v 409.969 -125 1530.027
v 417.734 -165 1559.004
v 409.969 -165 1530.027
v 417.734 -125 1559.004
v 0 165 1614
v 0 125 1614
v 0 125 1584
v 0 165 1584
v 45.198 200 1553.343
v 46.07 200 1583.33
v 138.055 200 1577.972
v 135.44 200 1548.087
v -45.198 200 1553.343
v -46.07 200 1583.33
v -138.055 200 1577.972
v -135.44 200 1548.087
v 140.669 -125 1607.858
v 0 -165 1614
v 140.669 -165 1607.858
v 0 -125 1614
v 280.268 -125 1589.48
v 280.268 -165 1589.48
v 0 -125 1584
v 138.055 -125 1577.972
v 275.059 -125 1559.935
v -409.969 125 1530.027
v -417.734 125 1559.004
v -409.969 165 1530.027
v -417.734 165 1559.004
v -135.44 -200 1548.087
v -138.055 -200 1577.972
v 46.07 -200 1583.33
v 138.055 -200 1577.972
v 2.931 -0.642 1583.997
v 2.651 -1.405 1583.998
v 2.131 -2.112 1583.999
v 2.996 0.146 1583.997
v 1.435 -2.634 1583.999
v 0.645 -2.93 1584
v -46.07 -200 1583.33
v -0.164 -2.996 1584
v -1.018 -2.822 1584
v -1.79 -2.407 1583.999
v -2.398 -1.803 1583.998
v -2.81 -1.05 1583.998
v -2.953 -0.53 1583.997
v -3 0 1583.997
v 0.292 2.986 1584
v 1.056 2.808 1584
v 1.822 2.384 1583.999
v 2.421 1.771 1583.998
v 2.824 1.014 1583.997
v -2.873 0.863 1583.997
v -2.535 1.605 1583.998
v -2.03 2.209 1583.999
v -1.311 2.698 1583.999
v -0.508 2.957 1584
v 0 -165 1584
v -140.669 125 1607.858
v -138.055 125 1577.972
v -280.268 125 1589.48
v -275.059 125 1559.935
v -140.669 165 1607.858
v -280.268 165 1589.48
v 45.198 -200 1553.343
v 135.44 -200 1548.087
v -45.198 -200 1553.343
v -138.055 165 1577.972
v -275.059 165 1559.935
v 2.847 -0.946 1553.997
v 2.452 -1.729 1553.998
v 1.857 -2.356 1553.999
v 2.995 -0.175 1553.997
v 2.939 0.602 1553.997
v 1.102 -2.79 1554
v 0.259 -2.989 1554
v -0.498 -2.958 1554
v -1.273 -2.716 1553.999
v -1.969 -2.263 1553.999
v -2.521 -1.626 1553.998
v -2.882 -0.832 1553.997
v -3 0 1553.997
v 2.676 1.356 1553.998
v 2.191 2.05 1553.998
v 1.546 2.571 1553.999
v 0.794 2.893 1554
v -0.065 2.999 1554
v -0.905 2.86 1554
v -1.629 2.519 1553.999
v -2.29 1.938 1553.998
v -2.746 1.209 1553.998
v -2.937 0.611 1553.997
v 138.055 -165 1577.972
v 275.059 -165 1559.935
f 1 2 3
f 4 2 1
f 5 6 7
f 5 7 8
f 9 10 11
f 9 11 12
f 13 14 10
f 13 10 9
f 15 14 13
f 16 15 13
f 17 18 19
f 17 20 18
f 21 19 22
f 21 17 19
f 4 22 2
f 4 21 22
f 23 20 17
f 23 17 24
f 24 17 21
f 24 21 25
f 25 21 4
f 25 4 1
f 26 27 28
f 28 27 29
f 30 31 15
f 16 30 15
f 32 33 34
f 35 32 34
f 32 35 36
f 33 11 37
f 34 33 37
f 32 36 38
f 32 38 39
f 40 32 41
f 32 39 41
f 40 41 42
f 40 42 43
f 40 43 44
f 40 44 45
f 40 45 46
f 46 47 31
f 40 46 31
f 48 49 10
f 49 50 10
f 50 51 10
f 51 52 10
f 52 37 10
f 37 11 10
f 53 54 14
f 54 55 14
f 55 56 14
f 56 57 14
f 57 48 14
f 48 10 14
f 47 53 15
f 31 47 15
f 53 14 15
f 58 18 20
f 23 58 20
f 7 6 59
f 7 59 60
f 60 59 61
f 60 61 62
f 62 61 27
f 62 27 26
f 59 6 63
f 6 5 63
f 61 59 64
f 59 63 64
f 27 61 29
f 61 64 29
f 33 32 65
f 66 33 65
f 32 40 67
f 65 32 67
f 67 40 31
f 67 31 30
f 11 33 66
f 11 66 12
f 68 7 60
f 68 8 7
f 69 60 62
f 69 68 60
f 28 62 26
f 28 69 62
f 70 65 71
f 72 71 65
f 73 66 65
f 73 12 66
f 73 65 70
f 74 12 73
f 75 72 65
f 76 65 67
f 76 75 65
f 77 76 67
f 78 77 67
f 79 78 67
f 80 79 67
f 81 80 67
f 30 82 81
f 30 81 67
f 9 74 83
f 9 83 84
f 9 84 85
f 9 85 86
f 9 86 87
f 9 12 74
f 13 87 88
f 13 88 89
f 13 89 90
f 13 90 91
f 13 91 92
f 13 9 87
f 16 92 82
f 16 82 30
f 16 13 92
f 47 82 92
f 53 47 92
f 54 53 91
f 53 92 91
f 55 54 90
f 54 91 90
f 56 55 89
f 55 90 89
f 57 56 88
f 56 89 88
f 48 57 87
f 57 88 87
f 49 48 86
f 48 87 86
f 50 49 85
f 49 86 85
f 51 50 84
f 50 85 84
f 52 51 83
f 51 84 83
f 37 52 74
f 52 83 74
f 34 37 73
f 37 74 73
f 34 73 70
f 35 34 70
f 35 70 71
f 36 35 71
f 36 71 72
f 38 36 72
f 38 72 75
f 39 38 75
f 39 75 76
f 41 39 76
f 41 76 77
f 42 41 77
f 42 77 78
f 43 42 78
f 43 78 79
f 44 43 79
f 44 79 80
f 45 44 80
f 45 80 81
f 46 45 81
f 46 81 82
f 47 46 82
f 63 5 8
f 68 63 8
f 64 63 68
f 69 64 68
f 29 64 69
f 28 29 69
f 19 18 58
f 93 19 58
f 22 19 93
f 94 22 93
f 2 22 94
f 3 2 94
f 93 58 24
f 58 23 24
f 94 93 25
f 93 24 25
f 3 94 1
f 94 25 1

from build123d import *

# Parameters (mm, degrees)
F0_W     = 400
F0_H     = 30
F1_ANGLE = 10
F4_D     = 6
F4_DEPTH = 100
F5_W     = 40
F5_H     = 30
F6_ANGLE = 15
F7_ANGLE = -15


with BuildPart() as f1:
    # F0 (on Right) → F1 (revolve, symmetric)
    with BuildSketch(Plane.YZ) as f1_sk:
        with Locations((0, 1569)):
            Rectangle(F0_W, F0_H)
    revolve(axis=Axis((0, -0.207613, 0), (0, 1, 0)), revolution_arc=F1_ANGLE / 2)
    revolve(f1_sk.sketch, axis=Axis((0, -0.207613, 0), (0, -1, 0)), revolution_arc=F1_ANGLE / 2)

    # F4
    with Locations(Plane.XY.offset(1600)):
        with Locations((0, 0)):
            Hole(F4_D / 2, depth=F4_DEPTH)


with BuildPart() as f6:
    # F5 (on Right) → F6 (revolve)
    with BuildSketch(Plane.YZ):
        with Locations((-145, 1599)):
            Rectangle(F5_W, F5_H)
    revolve(axis=Axis((0, -0.207613, 0), (0, 1, 0)), revolution_arc=F6_ANGLE)


with BuildPart() as f7:
    # F5 (on Right) → F7 (revolve)
    with BuildSketch(Plane.YZ):
        with Locations((145, 1599)):
            Rectangle(F5_W, F5_H)
    revolve(axis=Axis((0, -0.207613, 0), (0, 1, 0)), revolution_arc=F7_ANGLE)


solid = Compound([f1.part, f6.part, f7.part])
